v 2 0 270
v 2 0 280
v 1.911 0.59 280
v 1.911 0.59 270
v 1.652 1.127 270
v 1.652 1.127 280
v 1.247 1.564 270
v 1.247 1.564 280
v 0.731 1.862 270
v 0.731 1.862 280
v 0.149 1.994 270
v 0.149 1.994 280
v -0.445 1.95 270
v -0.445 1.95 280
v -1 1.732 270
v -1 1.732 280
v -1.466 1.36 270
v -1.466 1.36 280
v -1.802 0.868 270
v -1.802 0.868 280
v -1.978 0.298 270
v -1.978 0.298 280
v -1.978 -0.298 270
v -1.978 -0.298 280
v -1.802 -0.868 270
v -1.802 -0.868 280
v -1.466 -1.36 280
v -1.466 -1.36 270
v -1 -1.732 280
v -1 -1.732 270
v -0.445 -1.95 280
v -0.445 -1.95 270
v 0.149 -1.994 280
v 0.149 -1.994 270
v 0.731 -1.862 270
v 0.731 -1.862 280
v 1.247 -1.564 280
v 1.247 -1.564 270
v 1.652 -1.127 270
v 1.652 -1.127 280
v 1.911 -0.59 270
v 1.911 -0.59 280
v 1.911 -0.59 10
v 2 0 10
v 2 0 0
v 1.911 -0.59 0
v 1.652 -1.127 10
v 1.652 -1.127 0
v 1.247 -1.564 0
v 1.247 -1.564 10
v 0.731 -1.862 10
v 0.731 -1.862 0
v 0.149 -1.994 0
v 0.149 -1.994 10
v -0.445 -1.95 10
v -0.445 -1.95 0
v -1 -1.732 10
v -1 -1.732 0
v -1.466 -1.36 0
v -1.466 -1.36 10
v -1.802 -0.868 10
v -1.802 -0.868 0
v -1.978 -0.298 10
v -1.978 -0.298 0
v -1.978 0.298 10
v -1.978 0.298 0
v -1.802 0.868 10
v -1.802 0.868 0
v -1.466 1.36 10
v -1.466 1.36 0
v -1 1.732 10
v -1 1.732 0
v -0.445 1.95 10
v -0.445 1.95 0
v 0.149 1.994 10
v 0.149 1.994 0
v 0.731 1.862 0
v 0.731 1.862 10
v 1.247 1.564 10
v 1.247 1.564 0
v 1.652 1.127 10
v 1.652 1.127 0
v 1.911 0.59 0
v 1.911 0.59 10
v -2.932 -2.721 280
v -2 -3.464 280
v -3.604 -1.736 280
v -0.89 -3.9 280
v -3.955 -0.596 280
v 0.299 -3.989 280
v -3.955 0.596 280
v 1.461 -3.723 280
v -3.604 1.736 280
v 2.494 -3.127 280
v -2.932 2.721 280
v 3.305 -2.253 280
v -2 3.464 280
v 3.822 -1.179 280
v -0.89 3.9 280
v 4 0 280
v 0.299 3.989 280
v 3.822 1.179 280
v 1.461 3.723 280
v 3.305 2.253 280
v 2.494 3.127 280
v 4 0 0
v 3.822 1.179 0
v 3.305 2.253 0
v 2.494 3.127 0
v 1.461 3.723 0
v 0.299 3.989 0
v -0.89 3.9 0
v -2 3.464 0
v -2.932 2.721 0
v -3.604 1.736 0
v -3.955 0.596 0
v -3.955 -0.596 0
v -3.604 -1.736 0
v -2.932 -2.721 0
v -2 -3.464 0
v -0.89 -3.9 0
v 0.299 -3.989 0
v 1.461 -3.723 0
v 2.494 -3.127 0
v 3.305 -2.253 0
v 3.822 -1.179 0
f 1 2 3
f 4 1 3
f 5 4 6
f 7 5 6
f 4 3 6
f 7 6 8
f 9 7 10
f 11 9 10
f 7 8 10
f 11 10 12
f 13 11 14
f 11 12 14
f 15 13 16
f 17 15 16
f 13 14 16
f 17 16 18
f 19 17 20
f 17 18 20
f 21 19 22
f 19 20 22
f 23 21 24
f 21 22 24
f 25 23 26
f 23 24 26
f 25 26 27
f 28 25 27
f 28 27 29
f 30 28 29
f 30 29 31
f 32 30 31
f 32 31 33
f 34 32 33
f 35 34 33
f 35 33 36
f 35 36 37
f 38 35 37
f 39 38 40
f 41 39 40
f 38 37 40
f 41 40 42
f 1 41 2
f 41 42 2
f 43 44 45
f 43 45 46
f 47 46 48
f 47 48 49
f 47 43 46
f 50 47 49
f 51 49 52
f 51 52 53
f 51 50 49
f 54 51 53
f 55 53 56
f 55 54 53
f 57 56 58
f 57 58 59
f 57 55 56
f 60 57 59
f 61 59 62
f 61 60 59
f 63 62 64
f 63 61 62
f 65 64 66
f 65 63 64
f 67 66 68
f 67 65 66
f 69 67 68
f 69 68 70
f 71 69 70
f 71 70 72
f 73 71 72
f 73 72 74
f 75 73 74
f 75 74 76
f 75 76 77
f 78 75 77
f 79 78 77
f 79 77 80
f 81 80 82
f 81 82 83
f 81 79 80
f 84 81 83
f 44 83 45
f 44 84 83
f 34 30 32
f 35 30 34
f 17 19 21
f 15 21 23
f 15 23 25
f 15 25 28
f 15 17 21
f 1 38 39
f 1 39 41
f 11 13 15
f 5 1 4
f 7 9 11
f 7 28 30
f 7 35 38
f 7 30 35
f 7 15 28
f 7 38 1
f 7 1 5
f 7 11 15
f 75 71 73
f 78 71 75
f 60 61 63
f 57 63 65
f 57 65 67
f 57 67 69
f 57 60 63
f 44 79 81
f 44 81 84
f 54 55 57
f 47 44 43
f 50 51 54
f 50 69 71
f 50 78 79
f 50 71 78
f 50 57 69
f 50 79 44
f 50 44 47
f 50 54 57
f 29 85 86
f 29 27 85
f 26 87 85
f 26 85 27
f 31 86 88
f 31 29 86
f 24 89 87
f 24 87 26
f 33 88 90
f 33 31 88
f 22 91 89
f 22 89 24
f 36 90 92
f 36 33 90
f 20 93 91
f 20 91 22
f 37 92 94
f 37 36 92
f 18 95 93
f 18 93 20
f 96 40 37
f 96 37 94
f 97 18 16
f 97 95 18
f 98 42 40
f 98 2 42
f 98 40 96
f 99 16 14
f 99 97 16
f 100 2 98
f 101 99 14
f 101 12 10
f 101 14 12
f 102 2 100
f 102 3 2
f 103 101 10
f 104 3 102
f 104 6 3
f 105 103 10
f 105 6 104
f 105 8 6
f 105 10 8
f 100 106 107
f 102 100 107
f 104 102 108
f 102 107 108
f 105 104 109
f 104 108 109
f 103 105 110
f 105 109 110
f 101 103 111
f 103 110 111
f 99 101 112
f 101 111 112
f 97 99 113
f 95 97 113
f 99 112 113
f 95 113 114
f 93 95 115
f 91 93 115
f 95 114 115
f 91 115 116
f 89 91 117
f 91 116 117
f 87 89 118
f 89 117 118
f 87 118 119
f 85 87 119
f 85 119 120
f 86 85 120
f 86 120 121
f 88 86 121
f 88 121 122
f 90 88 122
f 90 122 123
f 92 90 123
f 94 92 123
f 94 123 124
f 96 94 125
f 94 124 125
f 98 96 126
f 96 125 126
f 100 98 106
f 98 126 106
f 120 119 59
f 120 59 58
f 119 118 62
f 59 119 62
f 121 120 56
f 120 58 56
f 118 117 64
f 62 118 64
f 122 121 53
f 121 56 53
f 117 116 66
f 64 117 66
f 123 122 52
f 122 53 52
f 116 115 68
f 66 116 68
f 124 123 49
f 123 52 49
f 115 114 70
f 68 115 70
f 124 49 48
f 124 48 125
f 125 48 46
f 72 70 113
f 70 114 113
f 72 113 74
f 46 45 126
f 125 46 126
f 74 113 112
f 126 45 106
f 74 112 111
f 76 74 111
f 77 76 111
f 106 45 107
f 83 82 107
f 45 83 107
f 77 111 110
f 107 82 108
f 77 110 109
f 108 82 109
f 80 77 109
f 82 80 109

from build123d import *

# Parameters (mm, degrees)
SKETCH_1_R          = 4
EXTRUDE_1_DEPTH     = 280
SKETCH_2_R          = 2
CUT_EXTRUDE_1_DEPTH = 10
CUT_EXTRUDE_START   = -10
SKETCH_3_R          = 2
CUT_EXTRUDE_2_DEPTH = 10


with BuildPart() as part:
    # 草图1 → 凸台-拉伸1 (new body)
    with BuildSketch(Plane.XY):
        Circle(SKETCH_1_R)
    extrude(amount=EXTRUDE_1_DEPTH)

    # 草图2 → 切除-拉伸1 (cut)
    with BuildSketch(Plane.XY.offset(280)):
        Circle(SKETCH_2_R)
    extrude(amount=-CUT_EXTRUDE_1_DEPTH, mode=Mode.SUBTRACT)

    # 草图3 → 切除-拉伸2 (cut)
    with BuildSketch(Plane(origin=(0, 0, 0), x_dir=(-1, 0, 0), z_dir=(0, 0, -1)).offset(CUT_EXTRUDE_START)):
        with Locations(Location((0, 0, 0), (0, 0, 180))):
            Circle(SKETCH_3_R)
    extrude(amount=CUT_EXTRUDE_2_DEPTH, mode=Mode.SUBTRACT)


solid = part.part
